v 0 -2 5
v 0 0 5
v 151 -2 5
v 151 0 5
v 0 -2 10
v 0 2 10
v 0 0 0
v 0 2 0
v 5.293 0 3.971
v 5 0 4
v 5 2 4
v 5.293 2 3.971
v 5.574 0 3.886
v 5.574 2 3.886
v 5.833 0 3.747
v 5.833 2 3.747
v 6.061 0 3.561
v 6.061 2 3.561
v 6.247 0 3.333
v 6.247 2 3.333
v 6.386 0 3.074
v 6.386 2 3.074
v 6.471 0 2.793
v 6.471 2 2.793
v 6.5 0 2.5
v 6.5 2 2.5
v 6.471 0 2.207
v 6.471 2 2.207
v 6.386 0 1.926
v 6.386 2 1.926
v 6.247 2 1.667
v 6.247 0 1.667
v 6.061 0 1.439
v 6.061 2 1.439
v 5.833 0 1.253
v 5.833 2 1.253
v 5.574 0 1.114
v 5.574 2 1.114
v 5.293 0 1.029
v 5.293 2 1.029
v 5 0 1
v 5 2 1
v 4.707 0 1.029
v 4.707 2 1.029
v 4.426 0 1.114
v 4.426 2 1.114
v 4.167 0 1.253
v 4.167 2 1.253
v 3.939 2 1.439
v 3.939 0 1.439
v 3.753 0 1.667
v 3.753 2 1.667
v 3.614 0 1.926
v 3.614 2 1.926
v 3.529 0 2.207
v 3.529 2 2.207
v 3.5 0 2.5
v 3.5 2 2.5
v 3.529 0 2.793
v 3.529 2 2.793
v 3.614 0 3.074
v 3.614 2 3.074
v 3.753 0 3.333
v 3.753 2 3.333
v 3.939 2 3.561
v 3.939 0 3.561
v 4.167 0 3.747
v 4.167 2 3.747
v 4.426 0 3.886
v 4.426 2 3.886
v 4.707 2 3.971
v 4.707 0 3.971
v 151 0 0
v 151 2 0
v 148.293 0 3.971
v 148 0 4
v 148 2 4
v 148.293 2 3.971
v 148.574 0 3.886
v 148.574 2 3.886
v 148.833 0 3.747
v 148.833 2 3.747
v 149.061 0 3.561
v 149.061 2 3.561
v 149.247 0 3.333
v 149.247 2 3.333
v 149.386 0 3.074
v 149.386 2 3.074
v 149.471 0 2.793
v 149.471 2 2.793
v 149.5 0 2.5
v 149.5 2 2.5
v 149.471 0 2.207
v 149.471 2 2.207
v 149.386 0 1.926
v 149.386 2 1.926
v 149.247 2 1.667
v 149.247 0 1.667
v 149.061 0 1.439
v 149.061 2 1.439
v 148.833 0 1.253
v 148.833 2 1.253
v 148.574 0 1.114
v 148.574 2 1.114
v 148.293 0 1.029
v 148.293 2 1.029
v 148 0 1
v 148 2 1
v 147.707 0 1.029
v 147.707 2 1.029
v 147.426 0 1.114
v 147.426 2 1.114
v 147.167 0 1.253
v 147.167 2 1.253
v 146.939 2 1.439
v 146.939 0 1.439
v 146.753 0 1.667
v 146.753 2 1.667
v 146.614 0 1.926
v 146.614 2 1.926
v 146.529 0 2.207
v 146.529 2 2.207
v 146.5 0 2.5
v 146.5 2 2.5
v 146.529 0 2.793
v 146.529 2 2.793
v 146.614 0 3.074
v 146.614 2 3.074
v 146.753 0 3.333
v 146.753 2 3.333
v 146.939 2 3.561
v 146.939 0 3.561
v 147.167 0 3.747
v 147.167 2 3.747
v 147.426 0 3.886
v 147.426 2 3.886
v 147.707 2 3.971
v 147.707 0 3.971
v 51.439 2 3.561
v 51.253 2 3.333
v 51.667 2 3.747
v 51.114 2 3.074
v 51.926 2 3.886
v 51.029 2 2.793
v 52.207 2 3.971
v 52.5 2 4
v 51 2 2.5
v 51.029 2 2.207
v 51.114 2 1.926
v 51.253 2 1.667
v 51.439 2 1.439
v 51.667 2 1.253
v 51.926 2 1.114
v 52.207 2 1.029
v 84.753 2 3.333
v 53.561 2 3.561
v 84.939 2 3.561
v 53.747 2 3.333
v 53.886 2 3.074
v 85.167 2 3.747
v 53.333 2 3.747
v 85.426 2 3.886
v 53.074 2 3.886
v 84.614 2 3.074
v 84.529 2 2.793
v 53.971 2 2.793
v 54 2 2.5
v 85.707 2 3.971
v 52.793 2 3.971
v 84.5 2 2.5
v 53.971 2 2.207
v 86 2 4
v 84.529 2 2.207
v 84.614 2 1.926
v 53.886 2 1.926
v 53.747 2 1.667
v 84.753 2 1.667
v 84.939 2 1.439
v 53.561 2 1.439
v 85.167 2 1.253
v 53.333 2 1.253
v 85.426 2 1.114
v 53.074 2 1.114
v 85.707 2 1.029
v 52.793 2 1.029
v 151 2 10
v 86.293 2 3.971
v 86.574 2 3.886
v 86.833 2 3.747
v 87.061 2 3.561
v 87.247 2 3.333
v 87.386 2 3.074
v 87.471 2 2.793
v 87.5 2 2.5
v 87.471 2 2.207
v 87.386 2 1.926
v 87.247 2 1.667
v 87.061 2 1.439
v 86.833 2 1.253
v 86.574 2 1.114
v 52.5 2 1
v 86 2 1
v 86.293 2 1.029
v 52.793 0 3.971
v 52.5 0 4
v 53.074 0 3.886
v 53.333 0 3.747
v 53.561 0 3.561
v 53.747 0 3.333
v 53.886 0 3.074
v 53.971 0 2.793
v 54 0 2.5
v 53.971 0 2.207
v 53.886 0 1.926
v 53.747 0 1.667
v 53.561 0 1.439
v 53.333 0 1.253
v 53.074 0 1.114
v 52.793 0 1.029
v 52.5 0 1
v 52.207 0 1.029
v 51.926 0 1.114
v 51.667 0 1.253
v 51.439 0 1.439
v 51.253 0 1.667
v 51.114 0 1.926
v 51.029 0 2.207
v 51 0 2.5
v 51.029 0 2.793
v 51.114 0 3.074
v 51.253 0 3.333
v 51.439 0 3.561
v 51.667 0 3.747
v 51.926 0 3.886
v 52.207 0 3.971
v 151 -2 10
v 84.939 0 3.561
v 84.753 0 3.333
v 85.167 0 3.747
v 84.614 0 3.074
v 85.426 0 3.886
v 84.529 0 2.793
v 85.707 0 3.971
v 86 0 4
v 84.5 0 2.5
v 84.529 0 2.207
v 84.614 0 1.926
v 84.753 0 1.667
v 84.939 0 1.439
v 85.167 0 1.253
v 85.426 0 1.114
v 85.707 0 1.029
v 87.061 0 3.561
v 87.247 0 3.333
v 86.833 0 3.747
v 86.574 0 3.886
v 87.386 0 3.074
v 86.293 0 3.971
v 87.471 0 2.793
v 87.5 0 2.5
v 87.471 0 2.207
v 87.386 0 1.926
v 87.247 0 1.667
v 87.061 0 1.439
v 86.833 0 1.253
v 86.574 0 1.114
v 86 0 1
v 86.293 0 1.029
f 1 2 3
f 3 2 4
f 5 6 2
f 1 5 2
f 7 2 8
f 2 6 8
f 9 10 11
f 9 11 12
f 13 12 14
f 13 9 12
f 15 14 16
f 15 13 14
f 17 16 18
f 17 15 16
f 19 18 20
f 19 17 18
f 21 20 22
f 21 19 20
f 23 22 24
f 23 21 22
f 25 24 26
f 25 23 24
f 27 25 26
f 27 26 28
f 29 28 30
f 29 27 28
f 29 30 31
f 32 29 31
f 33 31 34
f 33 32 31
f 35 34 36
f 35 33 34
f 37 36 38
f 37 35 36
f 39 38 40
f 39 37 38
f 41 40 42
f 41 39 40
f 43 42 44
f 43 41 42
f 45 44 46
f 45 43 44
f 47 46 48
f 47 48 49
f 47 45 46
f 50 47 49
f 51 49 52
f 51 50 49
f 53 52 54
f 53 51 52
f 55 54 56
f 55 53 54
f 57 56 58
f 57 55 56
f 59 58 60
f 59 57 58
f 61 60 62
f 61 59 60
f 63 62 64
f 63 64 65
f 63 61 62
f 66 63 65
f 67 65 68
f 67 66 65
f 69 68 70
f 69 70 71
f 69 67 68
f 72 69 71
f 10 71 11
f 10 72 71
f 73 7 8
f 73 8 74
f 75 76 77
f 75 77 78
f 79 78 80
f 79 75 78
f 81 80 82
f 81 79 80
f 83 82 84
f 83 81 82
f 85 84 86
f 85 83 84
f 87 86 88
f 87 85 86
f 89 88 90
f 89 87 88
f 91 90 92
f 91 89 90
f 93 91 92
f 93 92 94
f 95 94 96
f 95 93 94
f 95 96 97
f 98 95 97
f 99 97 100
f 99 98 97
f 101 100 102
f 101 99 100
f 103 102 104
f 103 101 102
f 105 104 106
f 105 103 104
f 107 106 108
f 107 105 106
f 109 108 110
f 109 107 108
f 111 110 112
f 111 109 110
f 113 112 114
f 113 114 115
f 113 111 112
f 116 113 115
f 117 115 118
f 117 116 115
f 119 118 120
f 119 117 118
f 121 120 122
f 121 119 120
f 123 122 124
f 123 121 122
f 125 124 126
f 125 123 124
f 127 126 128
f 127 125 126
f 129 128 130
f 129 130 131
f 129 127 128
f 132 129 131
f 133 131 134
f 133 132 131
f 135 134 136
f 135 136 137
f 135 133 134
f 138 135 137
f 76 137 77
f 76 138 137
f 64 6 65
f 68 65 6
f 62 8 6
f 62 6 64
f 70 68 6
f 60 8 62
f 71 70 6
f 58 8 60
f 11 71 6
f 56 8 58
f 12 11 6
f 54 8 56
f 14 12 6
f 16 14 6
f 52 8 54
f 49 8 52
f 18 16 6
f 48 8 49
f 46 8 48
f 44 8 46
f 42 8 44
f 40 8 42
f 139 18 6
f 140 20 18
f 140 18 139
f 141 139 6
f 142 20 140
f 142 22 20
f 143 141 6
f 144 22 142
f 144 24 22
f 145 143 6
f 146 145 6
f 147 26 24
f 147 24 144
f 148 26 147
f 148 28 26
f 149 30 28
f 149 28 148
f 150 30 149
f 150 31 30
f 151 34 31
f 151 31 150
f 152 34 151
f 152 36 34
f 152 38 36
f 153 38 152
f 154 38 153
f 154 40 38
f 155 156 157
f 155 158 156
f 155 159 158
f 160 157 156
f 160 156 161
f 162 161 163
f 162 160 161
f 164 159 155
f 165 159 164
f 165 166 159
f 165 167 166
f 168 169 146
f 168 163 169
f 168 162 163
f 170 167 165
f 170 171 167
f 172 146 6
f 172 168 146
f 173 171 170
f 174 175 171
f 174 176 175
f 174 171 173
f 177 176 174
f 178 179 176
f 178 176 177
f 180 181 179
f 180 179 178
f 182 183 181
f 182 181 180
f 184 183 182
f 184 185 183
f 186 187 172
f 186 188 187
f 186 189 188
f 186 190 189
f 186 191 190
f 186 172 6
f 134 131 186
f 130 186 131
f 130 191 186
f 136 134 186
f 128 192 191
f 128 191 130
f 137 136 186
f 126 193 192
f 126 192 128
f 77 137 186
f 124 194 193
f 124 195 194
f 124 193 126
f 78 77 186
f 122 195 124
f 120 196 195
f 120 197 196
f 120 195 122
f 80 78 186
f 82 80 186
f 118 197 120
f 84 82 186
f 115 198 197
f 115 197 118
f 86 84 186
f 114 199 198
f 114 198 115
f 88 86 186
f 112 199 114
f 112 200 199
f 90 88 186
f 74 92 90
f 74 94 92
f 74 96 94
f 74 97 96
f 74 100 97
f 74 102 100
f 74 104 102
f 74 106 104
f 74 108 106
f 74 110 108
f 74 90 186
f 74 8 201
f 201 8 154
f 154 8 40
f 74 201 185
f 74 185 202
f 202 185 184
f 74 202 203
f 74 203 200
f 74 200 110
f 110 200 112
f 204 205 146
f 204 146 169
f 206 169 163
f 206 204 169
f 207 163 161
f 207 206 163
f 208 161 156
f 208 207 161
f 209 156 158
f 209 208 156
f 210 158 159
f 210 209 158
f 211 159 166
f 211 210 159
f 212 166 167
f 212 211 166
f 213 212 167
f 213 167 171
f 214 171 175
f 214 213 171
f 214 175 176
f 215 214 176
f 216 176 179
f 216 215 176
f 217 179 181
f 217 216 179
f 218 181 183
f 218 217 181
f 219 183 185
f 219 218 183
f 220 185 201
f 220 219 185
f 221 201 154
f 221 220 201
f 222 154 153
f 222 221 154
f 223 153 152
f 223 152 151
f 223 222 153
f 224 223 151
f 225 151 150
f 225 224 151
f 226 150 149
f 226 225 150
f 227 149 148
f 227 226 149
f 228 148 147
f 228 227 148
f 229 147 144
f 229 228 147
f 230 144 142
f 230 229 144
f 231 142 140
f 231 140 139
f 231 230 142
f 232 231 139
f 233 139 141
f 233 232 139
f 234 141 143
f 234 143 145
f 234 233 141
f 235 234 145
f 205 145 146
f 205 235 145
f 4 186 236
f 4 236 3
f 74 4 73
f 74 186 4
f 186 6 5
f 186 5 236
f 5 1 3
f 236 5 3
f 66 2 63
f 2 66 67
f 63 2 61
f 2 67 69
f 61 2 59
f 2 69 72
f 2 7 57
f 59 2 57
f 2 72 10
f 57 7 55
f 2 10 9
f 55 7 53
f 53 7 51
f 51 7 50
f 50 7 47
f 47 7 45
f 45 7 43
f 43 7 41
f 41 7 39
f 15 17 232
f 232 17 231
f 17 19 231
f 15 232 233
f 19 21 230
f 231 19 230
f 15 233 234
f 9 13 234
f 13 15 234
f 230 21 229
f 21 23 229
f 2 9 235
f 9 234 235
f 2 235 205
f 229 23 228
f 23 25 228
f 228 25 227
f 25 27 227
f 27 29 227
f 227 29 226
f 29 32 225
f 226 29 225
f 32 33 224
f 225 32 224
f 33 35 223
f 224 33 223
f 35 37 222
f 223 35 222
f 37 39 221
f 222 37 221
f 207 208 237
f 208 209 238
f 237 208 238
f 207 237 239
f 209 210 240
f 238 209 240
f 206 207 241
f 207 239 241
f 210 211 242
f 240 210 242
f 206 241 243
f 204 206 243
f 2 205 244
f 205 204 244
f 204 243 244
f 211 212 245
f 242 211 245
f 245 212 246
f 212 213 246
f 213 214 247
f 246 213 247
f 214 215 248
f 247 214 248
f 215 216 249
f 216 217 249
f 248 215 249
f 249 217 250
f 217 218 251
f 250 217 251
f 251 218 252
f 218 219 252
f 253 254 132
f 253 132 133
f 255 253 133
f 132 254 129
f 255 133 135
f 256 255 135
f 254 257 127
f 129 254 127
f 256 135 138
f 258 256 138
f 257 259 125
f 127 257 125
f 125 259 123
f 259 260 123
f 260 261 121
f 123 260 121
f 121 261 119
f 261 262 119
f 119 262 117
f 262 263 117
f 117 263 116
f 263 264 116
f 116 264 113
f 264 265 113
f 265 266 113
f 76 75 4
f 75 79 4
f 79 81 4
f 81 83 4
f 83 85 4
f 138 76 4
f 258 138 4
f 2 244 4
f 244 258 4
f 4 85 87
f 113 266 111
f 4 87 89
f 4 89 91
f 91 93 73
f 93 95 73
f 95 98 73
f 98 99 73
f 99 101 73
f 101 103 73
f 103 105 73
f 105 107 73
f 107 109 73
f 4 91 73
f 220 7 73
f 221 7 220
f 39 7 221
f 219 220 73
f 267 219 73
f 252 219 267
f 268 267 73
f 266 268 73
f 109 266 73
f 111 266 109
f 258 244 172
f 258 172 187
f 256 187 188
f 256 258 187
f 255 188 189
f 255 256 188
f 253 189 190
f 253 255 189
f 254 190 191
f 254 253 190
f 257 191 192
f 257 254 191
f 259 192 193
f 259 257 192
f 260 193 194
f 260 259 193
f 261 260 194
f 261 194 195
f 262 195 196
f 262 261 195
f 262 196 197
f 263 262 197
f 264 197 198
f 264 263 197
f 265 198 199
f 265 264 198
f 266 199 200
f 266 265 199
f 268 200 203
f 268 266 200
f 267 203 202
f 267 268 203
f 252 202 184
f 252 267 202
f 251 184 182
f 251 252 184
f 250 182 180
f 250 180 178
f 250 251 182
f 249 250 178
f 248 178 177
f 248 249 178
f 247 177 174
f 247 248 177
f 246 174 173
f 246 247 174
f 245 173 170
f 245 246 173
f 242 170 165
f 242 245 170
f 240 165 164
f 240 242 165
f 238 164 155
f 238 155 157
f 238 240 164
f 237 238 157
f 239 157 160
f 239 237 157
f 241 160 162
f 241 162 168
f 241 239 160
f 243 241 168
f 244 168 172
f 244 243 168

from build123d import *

# Parameters (mm, degrees)
SKETCH_1_W      = 151
SKETCH_1_H      = 5
SKETCH_1_R      = 1.5
EXTRUDE_1_DEPTH = 2
EXTRUDE_START   = 2
SKETCH_2_W      = 151
SKETCH_2_H      = 5
EXTRUDE_2_DEPTH = 4


with BuildPart() as part:
    # 草图1 → 凸台-拉伸1 (new body)
    with BuildSketch(Plane(origin=(0, 0, 0), x_dir=(1, 0, 0), z_dir=(0, 1, 0))):
        with Locations((75.5, -2.5)):
            Rectangle(SKETCH_1_W, SKETCH_1_H)
        with Locations(Location((5, -2.5, 0), (0, 0, 270))):
            Circle(SKETCH_1_R, mode=Mode.SUBTRACT)
        with Locations(Location((52.5, -2.5, 0), (0, 0, 270))):
            Circle(SKETCH_1_R, mode=Mode.SUBTRACT)
        with Locations(Location((86, -2.5, 0), (0, 0, 270))):
            Circle(SKETCH_1_R, mode=Mode.SUBTRACT)
        with Locations(Location((148, -2.5, 0), (0, 0, 270))):
            Circle(SKETCH_1_R, mode=Mode.SUBTRACT)
    extrude(amount=EXTRUDE_1_DEPTH)

    # 草图2 → 凸台-拉伸2 (add)
    with BuildSketch(Plane(origin=(0, 0, 0), x_dir=(1, 0, 0), z_dir=(0, 1, 0)).offset(EXTRUDE_START)):
        with Locations((75.5, -7.5)):
            Rectangle(SKETCH_2_W, SKETCH_2_H)
    extrude(amount=-EXTRUDE_2_DEPTH)


solid = part.part
